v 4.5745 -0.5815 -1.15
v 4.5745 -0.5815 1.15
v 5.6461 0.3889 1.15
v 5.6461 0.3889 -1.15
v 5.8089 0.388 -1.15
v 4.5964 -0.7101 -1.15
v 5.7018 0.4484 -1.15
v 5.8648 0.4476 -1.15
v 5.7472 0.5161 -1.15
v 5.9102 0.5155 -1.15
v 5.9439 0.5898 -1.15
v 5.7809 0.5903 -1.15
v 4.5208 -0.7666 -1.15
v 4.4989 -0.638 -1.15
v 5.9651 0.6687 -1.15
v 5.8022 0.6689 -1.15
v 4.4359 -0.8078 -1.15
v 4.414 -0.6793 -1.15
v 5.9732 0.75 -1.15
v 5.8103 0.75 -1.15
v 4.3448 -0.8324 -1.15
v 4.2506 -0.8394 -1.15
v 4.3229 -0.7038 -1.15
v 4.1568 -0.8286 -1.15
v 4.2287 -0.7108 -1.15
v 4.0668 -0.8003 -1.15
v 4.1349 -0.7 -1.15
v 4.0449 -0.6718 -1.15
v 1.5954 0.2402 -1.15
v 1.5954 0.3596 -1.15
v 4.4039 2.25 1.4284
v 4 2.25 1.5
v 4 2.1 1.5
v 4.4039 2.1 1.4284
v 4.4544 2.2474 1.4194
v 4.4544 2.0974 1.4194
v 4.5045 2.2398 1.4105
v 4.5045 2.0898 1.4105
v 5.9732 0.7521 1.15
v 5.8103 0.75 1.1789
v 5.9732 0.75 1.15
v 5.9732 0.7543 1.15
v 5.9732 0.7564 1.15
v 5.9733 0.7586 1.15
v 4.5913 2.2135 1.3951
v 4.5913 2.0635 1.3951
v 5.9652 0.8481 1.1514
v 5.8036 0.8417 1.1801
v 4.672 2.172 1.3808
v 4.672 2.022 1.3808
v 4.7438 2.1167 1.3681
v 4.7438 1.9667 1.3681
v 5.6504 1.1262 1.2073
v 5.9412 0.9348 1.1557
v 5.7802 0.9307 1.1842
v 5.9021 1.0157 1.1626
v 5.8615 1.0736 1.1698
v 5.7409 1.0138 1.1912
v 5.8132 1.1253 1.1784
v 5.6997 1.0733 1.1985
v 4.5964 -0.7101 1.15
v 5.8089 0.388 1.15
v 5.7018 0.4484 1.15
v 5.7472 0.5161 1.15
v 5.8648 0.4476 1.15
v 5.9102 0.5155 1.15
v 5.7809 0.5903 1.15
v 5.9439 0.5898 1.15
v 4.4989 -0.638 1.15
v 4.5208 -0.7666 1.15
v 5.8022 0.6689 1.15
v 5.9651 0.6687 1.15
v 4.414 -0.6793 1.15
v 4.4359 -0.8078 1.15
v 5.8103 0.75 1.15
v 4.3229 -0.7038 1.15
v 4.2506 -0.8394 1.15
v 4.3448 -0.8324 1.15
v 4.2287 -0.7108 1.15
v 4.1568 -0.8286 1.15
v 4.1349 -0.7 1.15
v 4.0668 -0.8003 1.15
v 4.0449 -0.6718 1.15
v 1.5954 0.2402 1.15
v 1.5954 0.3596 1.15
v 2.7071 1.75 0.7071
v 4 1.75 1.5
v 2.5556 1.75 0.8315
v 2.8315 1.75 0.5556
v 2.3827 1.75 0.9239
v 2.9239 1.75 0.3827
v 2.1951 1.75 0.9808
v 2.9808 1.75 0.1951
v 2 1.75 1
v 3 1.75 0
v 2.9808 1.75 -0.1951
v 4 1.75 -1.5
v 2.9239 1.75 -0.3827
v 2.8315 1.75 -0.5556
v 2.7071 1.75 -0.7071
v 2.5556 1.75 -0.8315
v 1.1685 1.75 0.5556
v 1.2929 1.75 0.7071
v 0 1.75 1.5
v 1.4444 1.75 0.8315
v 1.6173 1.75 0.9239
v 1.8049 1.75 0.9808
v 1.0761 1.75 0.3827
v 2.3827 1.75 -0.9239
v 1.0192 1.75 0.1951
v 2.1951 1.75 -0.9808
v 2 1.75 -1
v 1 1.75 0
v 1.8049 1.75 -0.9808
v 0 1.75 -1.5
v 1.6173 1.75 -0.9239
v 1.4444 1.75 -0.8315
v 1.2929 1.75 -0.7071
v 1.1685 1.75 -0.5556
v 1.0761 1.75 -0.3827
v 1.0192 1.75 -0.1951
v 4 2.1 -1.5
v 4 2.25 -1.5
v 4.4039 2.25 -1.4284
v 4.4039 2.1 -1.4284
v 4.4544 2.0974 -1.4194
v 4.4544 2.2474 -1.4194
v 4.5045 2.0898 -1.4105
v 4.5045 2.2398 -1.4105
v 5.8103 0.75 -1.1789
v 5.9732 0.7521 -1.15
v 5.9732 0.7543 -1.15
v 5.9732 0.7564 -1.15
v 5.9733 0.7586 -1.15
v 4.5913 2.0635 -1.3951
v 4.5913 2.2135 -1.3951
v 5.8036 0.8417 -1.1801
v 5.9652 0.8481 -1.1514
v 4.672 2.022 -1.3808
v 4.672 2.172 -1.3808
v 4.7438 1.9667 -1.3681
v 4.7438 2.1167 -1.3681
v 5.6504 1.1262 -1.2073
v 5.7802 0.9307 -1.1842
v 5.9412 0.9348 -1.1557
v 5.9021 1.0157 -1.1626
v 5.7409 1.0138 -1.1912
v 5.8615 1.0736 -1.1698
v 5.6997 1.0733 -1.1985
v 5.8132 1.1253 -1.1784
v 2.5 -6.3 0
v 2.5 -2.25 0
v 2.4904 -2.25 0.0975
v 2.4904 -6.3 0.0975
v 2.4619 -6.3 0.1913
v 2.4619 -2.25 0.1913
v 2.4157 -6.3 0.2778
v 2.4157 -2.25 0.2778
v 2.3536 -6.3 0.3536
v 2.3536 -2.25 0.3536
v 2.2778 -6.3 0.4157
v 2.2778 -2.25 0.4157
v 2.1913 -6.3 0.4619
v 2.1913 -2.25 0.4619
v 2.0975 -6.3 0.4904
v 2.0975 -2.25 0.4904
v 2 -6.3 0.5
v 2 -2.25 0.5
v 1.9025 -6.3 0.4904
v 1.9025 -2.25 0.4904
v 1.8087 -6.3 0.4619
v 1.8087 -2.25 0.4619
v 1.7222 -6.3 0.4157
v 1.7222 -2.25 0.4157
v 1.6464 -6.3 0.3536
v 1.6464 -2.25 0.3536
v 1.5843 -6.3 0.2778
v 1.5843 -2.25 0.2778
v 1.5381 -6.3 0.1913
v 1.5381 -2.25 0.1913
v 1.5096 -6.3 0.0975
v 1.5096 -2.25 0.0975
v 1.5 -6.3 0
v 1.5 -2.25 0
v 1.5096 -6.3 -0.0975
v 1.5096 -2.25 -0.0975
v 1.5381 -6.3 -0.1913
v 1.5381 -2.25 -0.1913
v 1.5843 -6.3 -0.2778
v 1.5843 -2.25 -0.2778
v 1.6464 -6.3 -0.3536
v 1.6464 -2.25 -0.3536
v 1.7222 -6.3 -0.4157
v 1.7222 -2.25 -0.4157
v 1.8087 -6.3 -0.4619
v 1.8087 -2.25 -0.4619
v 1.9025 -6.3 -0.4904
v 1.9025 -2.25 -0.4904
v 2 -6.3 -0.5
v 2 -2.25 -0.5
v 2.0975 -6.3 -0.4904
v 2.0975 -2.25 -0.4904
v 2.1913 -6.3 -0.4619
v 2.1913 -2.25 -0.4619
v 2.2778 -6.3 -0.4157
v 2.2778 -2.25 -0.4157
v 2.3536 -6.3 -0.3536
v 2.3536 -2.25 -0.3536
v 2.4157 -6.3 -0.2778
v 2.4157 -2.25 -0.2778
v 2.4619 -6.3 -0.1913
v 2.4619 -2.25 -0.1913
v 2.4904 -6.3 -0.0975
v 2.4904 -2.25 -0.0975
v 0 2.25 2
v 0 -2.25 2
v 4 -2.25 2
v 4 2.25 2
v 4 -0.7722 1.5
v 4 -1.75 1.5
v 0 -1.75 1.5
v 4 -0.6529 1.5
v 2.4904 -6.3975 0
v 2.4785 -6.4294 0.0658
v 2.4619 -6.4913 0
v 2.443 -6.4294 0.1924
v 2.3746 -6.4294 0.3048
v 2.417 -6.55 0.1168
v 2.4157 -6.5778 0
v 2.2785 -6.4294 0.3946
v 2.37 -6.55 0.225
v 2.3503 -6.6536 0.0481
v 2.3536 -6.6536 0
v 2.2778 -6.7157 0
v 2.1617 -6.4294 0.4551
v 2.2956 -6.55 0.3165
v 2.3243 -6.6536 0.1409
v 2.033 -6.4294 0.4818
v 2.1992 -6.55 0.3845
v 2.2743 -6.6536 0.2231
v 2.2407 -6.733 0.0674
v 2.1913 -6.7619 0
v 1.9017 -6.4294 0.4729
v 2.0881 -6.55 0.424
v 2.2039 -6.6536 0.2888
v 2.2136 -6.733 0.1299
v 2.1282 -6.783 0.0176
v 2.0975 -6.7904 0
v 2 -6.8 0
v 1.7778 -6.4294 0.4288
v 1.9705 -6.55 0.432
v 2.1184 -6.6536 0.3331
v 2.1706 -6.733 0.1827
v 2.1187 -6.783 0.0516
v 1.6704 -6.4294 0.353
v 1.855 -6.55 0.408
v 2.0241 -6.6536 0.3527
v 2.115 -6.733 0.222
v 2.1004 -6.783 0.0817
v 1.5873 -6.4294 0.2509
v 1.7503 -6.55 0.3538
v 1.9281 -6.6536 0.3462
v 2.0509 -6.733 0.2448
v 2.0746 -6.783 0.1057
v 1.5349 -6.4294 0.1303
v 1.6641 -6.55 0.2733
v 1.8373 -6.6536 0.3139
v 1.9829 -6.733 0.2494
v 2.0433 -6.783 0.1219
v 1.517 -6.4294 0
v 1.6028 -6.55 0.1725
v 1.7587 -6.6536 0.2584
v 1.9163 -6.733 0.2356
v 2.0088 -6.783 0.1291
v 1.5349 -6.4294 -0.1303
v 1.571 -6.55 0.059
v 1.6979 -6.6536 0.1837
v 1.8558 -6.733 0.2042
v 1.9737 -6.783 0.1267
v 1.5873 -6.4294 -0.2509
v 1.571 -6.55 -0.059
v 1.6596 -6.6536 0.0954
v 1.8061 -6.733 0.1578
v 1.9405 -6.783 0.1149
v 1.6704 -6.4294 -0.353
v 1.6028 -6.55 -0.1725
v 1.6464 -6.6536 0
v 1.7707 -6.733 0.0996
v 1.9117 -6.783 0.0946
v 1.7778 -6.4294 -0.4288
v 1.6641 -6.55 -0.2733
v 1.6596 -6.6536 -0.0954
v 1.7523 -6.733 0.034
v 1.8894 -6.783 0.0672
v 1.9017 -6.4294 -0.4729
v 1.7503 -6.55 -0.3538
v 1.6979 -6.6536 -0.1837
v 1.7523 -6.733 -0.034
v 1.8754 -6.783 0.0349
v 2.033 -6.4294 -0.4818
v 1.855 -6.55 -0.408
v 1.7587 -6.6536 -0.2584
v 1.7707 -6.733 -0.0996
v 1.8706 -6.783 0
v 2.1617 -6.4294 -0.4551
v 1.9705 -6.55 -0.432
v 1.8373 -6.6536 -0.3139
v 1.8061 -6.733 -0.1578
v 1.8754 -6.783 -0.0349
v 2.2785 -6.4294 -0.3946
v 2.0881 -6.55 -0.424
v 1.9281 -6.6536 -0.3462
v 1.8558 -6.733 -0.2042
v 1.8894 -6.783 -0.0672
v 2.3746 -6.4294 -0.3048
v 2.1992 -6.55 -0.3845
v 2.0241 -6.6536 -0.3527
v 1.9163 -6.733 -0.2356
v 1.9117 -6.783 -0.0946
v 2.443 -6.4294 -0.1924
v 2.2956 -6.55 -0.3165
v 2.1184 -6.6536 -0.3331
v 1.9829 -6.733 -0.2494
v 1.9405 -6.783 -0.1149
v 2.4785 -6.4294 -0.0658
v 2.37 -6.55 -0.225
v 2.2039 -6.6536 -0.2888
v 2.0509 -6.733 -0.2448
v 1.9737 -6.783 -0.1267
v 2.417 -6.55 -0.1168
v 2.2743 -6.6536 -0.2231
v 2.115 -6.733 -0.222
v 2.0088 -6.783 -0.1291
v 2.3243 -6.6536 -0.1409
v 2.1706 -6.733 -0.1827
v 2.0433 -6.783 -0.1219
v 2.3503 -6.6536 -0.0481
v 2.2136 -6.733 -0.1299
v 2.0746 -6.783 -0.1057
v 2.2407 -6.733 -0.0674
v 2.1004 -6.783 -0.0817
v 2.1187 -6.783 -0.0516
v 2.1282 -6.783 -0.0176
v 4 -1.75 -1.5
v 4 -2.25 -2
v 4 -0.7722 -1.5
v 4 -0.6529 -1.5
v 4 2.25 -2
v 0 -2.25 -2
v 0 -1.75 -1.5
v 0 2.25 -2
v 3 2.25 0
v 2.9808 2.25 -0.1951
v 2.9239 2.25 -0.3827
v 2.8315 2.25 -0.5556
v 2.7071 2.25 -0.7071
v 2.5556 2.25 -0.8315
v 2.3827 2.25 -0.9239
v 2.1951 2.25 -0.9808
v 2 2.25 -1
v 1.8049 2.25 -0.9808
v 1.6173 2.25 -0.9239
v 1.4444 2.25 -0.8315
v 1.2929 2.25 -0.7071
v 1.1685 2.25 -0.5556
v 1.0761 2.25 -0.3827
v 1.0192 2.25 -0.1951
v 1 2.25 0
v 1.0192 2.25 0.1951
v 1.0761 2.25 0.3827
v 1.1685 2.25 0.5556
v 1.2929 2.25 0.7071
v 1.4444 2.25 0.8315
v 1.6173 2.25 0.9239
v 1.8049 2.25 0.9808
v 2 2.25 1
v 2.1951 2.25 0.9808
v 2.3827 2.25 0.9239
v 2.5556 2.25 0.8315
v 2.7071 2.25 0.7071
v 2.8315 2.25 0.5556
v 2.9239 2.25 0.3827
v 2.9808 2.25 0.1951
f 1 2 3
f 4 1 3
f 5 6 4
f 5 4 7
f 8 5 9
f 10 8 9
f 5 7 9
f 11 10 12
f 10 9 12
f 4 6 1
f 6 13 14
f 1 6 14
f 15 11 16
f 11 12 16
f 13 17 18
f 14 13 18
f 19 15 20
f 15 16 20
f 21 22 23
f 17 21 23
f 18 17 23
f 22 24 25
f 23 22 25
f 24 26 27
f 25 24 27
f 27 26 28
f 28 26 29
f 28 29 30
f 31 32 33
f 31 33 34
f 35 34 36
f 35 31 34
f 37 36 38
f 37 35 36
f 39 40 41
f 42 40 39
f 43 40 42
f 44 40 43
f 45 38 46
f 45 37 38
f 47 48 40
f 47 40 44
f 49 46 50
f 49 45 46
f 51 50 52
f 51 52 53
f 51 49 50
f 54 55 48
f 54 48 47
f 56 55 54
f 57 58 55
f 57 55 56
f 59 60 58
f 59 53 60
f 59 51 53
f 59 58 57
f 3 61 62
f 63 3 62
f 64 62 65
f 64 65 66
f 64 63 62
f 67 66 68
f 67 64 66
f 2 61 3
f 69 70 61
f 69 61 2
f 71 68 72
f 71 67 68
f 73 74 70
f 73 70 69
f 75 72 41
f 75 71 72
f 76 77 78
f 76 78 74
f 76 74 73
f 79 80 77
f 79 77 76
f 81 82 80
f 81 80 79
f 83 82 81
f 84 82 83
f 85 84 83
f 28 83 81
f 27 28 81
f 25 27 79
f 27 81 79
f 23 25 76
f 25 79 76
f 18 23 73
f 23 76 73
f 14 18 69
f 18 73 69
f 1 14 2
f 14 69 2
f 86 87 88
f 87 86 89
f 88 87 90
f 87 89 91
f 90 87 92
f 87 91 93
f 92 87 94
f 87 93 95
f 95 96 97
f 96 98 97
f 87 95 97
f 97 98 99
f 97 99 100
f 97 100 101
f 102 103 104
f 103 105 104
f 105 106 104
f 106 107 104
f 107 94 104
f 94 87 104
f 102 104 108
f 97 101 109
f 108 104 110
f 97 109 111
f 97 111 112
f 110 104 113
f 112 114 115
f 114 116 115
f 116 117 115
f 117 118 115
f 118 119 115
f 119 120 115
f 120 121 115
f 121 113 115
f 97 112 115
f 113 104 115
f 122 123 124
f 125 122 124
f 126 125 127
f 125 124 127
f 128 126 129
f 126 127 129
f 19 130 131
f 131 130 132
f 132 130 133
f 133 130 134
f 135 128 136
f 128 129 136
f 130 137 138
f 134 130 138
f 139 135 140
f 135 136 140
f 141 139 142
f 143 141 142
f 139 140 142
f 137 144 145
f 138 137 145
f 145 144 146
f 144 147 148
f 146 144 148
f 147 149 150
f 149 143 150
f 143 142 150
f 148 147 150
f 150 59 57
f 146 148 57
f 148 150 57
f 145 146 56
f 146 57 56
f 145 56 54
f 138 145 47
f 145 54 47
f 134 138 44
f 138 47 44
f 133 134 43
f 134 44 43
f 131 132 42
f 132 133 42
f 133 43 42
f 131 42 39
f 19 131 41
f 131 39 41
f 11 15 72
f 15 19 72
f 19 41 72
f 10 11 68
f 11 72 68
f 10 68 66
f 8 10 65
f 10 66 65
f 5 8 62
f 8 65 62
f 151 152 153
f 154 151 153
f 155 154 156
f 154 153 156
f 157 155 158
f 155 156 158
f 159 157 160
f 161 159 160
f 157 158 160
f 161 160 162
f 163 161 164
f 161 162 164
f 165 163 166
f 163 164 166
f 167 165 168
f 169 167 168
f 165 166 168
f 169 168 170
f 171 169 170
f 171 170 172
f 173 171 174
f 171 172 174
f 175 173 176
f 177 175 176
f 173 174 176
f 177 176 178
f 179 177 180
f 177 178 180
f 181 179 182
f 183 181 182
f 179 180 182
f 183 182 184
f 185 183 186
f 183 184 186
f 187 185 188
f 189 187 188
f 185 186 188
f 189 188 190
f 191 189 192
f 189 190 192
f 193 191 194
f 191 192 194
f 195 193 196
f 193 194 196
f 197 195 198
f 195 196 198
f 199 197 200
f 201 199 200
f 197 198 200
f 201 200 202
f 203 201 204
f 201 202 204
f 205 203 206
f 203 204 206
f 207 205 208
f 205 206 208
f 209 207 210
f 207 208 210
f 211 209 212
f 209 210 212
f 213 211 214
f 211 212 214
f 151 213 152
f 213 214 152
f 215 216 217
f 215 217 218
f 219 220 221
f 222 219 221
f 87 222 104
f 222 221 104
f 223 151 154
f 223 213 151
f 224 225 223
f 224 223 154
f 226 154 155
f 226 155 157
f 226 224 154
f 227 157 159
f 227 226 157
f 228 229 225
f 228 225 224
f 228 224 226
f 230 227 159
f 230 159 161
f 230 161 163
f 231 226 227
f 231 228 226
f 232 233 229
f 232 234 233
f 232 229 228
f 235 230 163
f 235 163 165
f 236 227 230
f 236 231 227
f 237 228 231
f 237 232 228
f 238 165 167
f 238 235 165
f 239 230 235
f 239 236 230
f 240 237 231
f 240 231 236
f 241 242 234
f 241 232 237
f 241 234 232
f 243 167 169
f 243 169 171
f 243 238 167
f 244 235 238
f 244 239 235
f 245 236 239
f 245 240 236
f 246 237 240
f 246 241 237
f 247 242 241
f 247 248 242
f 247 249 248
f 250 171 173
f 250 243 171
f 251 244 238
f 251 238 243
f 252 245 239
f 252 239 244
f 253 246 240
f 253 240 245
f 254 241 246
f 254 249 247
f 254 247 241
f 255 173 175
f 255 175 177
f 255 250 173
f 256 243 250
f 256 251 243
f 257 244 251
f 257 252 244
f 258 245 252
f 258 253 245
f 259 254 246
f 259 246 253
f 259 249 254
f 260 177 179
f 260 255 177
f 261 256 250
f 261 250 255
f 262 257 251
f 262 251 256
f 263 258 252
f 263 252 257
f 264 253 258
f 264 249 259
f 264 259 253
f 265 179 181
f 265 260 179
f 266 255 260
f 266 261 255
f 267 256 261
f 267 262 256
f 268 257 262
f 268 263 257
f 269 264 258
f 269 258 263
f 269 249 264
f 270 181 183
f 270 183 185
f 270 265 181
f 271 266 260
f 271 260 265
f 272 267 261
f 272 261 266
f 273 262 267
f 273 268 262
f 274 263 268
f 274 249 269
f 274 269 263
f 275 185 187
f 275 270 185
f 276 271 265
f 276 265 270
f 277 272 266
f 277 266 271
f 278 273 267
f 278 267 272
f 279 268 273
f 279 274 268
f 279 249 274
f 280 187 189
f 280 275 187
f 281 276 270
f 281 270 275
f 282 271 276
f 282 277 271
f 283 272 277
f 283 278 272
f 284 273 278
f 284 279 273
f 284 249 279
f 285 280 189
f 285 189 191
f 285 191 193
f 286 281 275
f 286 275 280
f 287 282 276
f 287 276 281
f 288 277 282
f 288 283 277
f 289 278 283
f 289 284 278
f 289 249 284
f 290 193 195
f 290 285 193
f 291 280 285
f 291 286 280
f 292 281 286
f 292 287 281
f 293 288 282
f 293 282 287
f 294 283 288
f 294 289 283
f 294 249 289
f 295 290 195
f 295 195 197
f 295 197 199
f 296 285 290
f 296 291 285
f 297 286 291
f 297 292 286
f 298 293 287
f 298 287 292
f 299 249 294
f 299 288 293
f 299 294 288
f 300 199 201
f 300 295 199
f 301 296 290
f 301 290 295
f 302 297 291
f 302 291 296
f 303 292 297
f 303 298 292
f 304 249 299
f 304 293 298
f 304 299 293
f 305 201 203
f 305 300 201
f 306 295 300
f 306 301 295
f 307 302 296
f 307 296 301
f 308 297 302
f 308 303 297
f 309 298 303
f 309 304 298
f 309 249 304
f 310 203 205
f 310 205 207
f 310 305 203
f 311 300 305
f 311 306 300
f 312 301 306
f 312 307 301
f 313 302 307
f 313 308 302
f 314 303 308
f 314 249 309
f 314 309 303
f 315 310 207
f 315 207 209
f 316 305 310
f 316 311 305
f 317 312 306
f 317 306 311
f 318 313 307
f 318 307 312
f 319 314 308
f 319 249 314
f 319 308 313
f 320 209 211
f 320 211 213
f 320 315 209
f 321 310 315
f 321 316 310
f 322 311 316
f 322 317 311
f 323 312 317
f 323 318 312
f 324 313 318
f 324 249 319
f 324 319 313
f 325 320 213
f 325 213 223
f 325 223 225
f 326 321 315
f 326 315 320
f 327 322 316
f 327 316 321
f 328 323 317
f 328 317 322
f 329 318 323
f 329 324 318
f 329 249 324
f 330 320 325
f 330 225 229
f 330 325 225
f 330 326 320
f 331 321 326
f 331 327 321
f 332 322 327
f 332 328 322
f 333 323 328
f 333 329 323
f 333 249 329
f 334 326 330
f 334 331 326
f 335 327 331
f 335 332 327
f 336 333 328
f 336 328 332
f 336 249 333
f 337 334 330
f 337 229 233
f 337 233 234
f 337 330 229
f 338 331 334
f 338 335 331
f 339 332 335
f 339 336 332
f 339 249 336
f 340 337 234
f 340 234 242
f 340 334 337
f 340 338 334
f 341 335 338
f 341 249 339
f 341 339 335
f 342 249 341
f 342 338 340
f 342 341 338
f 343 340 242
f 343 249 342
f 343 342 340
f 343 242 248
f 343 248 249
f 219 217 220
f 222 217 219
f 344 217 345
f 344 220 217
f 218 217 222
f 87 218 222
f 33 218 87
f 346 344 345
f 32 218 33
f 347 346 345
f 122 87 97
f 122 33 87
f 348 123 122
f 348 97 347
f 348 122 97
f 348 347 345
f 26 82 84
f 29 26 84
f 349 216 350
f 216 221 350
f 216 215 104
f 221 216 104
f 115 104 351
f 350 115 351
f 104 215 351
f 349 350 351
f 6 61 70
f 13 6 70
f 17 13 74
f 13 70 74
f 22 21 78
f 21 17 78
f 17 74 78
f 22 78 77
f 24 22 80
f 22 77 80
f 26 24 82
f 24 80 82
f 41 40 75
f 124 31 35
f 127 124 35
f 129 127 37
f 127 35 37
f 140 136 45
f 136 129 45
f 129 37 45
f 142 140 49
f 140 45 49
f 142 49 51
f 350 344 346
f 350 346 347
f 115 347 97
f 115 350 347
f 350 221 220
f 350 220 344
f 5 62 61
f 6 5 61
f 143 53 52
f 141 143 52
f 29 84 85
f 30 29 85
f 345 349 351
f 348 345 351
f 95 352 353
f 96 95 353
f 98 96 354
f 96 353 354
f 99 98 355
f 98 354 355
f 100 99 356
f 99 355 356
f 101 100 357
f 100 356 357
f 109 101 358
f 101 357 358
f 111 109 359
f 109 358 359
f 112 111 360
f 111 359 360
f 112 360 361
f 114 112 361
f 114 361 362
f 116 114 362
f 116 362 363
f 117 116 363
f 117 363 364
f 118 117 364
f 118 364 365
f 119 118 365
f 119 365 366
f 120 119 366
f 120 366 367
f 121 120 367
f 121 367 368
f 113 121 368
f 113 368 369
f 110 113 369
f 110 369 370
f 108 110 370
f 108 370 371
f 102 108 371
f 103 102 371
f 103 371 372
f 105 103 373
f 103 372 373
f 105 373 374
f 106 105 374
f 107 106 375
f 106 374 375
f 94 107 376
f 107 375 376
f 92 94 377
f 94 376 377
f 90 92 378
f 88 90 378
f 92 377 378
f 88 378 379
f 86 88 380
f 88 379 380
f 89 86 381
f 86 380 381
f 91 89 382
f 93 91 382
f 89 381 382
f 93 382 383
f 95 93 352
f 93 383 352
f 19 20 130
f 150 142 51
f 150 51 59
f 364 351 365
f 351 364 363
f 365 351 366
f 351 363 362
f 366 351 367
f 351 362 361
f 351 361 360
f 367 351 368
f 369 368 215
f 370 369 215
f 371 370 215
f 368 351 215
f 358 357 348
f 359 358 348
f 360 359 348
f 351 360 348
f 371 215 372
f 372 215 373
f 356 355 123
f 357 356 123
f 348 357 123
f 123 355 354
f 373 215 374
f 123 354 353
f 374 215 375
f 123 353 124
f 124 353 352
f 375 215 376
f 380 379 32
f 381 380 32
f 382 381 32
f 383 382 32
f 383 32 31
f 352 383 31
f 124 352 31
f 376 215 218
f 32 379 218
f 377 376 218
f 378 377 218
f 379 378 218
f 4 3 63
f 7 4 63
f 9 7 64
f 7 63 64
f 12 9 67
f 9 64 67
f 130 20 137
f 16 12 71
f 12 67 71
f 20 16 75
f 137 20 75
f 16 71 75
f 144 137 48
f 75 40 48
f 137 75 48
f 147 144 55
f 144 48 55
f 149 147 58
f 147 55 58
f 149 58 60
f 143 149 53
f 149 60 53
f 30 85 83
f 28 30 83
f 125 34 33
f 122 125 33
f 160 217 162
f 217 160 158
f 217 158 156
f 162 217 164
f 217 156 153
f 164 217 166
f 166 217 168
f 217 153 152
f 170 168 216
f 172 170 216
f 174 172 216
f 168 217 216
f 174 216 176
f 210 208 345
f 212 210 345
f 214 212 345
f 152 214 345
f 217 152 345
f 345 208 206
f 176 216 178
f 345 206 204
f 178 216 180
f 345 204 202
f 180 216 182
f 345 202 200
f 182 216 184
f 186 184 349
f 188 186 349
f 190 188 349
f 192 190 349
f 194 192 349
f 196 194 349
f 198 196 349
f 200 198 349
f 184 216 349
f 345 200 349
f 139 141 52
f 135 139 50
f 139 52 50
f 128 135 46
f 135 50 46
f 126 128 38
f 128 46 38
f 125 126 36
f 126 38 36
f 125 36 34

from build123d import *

# Parameters (mm, degrees)
SKETCH1_W               = 4
SKETCH1_H               = 4.5
SKETCH1_W_2             = 3
SKETCH1_H_2             = 3.5
BOSS_EXTRUDE1_DEPTH     = 4
SKETCH2_R               = 0.5
BOSS_EXTRUDE2_DEPTH     = 4.55
FILLET1_R               = 0.5
SKETCH3_R               = 1
CUT_EXTRUDE1_DEPTH      = 2.55
BOSS_EXTRUDE3_START     = -0.5
BOSS_EXTRUDE3_DEPTH     = 3
CUT_EXTRUDE2_DEPTH      = 1.5
SKETCH7_W               = 0.349986897
SKETCH7_H               = 2
CUT_EXTRUDE3_DEPTH      = 4.5
CUT_EXTRUDE3_DEPTH_BACK = 7.5


with BuildPart() as part:
    # Sketch1 → Boss-Extrude1 (new body)
    with BuildSketch(Plane(origin=(0, 0, 0), x_dir=(0, 0, -1), z_dir=(1, 0, 0))):
        Rectangle(SKETCH1_W, SKETCH1_H)
        Rectangle(SKETCH1_W_2, SKETCH1_H_2, mode=Mode.SUBTRACT)
    extrude(amount=BOSS_EXTRUDE1_DEPTH)

    # Sketch2 → Boss-Extrude2 (add)
    with BuildSketch(Plane.XZ.offset(2.25)):
        with Locations((2, 0)):
            Circle(SKETCH2_R)
    extrude(amount=BOSS_EXTRUDE2_DEPTH)

    # Fillet1
    fillet1_edges = [part.edges().sort_by_distance(p)[0] for p in [
        (1.5, -6.8, 0),
    ]]
    fillet(fillet1_edges, radius=FILLET1_R)

    # Sketch3 → Cut-Extrude1 (cut)
    with BuildSketch(Plane(origin=(0, 2.25, 0), x_dir=(1, 0, 0), z_dir=(0, 1, 0))):
        with Locations((2, 0)):
            Circle(SKETCH3_R)
    extrude(amount=-CUT_EXTRUDE1_DEPTH, mode=Mode.SUBTRACT)

    # Sketch5 → Boss-Extrude3 (add)
    with BuildSketch(Plane.XY.offset(2).offset(BOSS_EXTRUDE3_START)):
        with BuildLine():
            Line((4, 2.25), (4.403883865, 2.25))
            ThreePointArc((4.403883865, 2.25), (4.586458051, 2.215474668), (4.743818499, 2.116666667))
            Line((4.743818499, 2.116666667), (5.813186883, 1.125261165))
            ThreePointArc((5.813186883, 1.125261165), (5.973243782, 0.755684806), (5.808896382, 0.387996313))
            Line((5.808896382, 0.387996313), (4.596439486, -0.710104164))
            ThreePointArc((4.596439486, -0.710104164), (4.344752484, -0.832406779), (4.066768671, -0.800324431))
            Line((4.066768671, -0.800324431), (1.595431684, 0.240227029))
            Line((1.595431684, 0.240227029), (1.595431684, 0.359579889))
            Line((1.595431684, 0.359579889), (4.04486832, -0.671750473))
            ThreePointArc((4.04486832, -0.671750473), (4.322852132, -0.703832821), (4.574539135, -0.581530206))
            Line((4.574539135, -0.581530206), (5.646078544, 0.388943829))
            ThreePointArc((5.646078544, 0.388943829), (5.810425944, 0.756632322), (5.650369044, 1.126208681))
            Line((5.650369044, 1.126208681), (4.743818499, 1.966666667))
            ThreePointArc((4.743818499, 1.966666667), (4.586458051, 2.065474668), (4.403883865, 2.1))
            Line((4.403883865, 2.1), (4, 2.1))
            Line((4, 2.1), (4, 2.25))
        make_face()
    extrude(amount=-BOSS_EXTRUDE3_DEPTH)

    # Sketch6 → Cut-Extrude2 (cut)
    with BuildSketch(Plane(origin=(0, 2.25, 0), x_dir=(1, 0, 0), z_dir=(0, 1, 0))):
        Polygon((4, 1.5), (5.973252249, 1.15), (5.973252249, 1.5), align=None)
        Polygon((4, -1.5), (5.973252249, -1.15), (5.973252249, -1.5), align=None)
    extrude(amount=-CUT_EXTRUDE2_DEPTH, mode=Mode.SUBTRACT)

    # Sketch7 → Cut-Extrude3 (cut, two sides)
    with BuildSketch(Plane(origin=(4, 0, 0), x_dir=(0, 0, -1), z_dir=(1, 0, 0))) as cut_extrude3_sk:
        with Locations((-1.325006552, -0.25)):
            Rectangle(SKETCH7_W, SKETCH7_H)
        with Locations((1.325006552, -0.25)):
            Rectangle(SKETCH7_W, SKETCH7_H)
    extrude(amount=CUT_EXTRUDE3_DEPTH, mode=Mode.SUBTRACT)
    extrude(cut_extrude3_sk.sketch, amount=-CUT_EXTRUDE3_DEPTH_BACK, mode=Mode.SUBTRACT)


solid = part.part
